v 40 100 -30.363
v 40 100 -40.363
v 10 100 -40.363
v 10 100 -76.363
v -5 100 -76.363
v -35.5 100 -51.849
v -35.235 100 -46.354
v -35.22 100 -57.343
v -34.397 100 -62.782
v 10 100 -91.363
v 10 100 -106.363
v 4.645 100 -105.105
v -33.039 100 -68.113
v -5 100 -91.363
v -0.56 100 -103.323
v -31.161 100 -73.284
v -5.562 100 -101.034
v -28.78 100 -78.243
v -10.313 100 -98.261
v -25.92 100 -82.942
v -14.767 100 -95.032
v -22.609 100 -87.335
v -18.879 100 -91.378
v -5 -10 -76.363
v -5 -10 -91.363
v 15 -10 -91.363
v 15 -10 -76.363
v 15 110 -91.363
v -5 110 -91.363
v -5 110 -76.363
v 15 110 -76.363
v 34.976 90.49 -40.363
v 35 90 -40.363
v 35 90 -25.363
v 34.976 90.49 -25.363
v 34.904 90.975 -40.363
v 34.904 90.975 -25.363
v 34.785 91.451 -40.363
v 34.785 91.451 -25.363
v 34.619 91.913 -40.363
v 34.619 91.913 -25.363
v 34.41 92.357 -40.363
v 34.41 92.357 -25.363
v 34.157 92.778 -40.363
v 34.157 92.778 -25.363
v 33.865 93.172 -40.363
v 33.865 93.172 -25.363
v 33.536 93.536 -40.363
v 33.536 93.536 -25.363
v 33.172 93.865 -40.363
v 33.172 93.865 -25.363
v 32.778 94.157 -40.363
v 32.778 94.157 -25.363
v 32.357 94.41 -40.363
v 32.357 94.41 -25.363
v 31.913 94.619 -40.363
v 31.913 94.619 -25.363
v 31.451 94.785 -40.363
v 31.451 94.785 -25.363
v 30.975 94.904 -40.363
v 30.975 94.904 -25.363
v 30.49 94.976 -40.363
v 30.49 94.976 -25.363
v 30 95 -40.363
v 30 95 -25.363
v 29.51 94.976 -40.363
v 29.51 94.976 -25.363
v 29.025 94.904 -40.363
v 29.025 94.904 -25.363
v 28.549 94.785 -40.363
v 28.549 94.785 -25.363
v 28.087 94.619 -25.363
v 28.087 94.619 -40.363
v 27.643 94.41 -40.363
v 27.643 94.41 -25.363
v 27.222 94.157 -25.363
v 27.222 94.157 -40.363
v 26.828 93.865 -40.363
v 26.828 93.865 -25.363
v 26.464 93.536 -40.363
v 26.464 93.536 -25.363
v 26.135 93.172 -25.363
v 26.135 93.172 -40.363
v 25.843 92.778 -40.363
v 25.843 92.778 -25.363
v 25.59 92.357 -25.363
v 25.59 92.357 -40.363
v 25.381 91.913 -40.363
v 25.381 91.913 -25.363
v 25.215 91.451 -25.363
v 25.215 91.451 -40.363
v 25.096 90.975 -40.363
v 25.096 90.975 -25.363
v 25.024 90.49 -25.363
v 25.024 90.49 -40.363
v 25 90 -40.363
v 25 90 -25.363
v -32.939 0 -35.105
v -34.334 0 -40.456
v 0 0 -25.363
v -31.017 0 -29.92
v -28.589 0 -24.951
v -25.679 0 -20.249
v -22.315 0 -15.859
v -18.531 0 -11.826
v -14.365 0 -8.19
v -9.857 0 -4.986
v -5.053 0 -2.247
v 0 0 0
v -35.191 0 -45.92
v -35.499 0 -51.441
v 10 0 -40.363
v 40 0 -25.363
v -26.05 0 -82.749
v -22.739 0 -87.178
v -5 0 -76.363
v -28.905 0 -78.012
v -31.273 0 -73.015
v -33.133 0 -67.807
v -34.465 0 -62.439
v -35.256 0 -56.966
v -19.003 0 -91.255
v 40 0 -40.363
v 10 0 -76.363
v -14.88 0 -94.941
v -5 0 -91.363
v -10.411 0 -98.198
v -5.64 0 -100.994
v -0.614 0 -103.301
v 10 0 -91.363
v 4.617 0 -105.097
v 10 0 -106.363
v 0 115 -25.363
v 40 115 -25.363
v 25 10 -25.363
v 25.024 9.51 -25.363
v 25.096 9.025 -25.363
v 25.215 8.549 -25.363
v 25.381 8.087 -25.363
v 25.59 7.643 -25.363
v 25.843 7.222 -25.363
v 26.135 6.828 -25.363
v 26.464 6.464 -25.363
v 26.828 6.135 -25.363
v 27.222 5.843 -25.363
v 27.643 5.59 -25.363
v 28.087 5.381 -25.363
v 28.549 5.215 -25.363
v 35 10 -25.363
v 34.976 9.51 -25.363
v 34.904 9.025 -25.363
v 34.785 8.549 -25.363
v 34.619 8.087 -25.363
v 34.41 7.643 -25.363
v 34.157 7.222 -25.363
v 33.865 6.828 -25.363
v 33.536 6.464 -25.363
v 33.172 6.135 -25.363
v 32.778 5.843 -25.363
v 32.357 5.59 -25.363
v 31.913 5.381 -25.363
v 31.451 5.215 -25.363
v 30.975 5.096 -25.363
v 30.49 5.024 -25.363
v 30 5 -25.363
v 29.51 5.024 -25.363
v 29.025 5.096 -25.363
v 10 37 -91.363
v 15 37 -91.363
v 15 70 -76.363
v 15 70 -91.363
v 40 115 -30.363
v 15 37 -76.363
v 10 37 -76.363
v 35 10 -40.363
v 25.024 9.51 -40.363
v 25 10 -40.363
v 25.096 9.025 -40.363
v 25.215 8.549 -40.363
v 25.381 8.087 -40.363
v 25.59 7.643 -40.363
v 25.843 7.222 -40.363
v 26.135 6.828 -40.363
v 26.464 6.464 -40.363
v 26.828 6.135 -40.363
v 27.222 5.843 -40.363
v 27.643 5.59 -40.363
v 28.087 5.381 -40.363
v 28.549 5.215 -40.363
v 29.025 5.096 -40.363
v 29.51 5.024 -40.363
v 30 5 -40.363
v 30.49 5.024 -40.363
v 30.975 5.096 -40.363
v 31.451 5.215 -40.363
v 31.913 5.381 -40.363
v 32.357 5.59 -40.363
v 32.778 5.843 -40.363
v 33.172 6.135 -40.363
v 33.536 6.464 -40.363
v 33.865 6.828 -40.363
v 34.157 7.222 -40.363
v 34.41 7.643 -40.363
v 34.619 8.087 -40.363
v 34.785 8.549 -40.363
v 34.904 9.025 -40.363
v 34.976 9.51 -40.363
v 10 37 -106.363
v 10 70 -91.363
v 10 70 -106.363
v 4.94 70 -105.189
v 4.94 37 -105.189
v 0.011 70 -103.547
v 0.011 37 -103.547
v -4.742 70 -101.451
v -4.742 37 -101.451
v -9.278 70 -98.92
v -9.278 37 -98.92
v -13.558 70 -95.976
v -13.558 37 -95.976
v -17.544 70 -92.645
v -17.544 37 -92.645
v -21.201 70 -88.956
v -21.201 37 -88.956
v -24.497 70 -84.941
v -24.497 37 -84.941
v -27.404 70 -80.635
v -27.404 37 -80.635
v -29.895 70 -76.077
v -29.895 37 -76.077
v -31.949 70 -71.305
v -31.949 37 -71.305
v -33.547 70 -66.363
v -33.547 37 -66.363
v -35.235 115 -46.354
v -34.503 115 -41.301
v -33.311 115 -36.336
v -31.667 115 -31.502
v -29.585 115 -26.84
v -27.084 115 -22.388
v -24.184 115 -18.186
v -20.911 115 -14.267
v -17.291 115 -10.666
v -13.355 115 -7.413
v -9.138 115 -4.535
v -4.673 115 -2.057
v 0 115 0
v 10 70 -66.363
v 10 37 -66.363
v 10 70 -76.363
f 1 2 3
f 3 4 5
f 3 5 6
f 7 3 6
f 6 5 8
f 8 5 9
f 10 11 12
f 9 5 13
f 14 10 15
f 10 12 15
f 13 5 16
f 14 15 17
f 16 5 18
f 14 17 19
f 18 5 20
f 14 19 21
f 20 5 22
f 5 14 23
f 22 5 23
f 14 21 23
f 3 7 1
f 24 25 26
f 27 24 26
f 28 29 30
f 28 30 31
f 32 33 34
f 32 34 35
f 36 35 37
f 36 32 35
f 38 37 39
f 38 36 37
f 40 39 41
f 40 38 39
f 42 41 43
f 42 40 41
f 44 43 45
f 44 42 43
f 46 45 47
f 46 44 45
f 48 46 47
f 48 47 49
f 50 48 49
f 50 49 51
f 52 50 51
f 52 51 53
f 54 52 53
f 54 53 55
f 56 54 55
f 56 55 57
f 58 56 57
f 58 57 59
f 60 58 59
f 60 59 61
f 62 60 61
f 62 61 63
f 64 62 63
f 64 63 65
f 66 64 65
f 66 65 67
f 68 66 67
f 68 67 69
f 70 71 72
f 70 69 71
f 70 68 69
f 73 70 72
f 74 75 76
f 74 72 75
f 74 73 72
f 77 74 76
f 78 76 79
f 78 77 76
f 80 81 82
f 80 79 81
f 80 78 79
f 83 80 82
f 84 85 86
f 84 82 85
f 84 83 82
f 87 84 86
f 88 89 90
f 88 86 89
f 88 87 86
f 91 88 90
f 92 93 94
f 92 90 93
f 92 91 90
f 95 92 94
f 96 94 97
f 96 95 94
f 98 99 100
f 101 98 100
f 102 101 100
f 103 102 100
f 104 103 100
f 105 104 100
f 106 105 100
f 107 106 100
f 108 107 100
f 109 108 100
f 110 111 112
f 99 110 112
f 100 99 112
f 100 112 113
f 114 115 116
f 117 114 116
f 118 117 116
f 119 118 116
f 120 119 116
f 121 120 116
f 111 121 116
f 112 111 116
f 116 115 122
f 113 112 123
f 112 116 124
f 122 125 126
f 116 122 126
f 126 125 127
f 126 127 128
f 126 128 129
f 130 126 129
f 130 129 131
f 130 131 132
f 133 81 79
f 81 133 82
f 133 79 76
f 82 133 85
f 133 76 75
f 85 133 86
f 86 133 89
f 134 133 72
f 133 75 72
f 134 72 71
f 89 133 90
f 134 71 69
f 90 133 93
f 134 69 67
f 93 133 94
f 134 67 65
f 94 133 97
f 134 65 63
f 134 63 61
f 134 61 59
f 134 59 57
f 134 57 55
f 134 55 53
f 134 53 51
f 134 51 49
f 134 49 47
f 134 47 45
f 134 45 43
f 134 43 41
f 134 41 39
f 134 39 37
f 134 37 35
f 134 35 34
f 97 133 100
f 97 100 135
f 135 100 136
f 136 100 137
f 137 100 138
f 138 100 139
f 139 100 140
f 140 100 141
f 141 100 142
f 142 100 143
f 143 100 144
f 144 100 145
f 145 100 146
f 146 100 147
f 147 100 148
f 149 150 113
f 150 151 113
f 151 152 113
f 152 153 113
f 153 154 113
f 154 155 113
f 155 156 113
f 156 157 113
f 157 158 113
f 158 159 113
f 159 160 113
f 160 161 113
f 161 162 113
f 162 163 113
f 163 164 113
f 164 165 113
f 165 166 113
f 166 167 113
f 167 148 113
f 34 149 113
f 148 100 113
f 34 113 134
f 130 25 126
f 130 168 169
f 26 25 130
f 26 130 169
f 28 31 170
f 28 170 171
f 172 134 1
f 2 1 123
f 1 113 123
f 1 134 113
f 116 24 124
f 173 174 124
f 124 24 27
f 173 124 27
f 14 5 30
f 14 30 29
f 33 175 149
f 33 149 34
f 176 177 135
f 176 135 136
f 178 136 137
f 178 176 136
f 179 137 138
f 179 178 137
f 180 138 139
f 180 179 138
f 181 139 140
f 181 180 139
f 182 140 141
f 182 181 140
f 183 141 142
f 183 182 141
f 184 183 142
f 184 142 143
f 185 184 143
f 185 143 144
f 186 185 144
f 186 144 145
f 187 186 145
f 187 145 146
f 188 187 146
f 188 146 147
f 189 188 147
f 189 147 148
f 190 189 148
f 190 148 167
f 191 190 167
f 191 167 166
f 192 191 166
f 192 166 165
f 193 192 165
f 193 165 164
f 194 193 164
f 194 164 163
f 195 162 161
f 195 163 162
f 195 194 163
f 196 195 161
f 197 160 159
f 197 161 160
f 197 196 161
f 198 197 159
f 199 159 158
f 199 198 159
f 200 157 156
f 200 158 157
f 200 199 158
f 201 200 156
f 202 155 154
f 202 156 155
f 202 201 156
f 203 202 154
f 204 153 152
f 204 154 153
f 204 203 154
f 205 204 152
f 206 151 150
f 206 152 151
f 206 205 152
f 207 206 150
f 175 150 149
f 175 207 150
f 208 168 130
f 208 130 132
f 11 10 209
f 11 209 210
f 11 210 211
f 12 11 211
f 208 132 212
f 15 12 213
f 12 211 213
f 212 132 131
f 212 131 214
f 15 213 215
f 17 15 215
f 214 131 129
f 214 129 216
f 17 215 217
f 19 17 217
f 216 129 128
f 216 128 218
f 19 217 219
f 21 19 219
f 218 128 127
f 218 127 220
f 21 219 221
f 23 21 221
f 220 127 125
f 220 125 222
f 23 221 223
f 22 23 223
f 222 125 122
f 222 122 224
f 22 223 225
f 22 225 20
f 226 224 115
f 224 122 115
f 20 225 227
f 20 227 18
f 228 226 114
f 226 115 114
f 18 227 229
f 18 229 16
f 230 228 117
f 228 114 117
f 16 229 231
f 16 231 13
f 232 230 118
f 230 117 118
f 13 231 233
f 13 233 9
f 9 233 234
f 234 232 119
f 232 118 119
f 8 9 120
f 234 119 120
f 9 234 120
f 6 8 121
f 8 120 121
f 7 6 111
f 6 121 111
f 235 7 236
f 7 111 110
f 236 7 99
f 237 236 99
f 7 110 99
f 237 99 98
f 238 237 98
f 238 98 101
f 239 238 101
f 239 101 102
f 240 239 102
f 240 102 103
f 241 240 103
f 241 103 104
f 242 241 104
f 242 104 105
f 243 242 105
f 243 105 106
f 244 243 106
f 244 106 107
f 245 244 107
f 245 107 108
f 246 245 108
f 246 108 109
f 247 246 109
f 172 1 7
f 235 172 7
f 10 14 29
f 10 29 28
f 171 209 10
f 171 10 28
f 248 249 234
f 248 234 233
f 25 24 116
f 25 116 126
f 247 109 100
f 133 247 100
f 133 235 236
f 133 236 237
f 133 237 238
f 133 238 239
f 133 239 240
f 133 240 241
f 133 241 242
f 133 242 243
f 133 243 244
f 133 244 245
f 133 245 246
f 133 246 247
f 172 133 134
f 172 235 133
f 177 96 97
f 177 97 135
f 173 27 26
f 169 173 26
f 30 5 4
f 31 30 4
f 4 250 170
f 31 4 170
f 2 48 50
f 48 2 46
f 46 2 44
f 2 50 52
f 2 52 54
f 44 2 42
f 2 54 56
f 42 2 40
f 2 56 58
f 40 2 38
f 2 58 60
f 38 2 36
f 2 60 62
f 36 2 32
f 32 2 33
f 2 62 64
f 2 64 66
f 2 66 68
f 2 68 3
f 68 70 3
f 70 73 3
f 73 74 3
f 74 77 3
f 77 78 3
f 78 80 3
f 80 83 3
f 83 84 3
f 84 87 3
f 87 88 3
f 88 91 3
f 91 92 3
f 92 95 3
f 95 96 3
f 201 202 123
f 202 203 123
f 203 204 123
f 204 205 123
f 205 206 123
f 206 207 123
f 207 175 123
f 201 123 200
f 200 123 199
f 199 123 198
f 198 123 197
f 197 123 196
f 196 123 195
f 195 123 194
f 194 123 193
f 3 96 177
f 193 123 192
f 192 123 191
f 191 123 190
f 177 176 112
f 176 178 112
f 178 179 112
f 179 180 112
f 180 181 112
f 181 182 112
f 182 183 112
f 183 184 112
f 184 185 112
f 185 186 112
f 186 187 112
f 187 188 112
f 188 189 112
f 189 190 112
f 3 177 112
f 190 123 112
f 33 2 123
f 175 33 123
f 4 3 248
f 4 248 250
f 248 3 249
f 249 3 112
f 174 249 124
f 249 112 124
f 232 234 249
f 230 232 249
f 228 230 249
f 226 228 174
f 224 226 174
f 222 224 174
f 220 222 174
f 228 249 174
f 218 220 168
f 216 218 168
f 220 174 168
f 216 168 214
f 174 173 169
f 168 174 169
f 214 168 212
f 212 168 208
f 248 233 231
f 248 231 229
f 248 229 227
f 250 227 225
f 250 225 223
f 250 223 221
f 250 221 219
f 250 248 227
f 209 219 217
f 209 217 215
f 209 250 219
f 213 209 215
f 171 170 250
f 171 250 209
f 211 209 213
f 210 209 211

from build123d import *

# Parameters (mm, degrees)
BOSS_EXTRUDE1_DEPTH = 115
CUT_EXTRUDE1_START  = -15
CUT_EXTRUDE1_DEPTH  = 15
BOSS_EXTRUDE2_START = -110
SKETCH3_W           = 20
SKETCH3_H           = 15
BOSS_EXTRUDE2_DEPTH = 120
SKETCH5_W           = 40
SKETCH5_H           = 33
CUT_EXTRUDE2_DEPTH  = 165.585219816
CUT_EXTRUDE3_DEPTH  = 139.495487291


with BuildPart() as part:
    # Sketch1 → Boss-Extrude1 (new body)
    with BuildSketch(Plane(origin=(0, 0, 0), x_dir=(1, 0, 0), z_dir=(0, 1, 0))):
        with BuildLine():
            Line((0, 0), (0, 25.362796982))
            Line((0, 25.362796982), (40, 25.362796982))
            Line((40, 25.362796982), (40, 40.362796982))
            Line((40, 40.362796982), (10, 40.362796982))
            Line((10, 40.362796982), (10, 106.362796982))
            ThreePointArc((10, 106.362796982), (-35.256322222, 56.96621079), (0, 0))
        make_face()
    extrude(amount=BOSS_EXTRUDE1_DEPTH)

    # Sketch2 → Cut-Extrude1 (cut)
    with BuildSketch(Plane(origin=(0, 115, 0), x_dir=(1, 0, 0), z_dir=(0, 1, 0)).offset(CUT_EXTRUDE1_START)):
        with BuildLine():
            Line((40, 30.362796982), (-35.235044142, 46.354499282))
            ThreePointArc((-35.235044142, 46.354499282), (-24.318751046, 85.179188449), (10, 106.362796982))
            Line((10, 106.362796982), (10, 40.362796982))
            Line((10, 40.362796982), (40, 40.362796982))
            Line((40, 40.362796982), (40, 30.362796982))
        make_face()
    extrude(amount=CUT_EXTRUDE1_DEPTH, mode=Mode.SUBTRACT)

    # Sketch3 → Boss-Extrude2 (add)
    with BuildSketch(Plane(origin=(0, 100, 0), x_dir=(1, 0, 0), z_dir=(0, 1, 0)).offset(BOSS_EXTRUDE2_START)):
        with Locations((5, 83.862796982)):
            Rectangle(SKETCH3_W, SKETCH3_H)
    extrude(amount=BOSS_EXTRUDE2_DEPTH)

    # Sketch5 → Cut-Extrude2 (cut, through all)
    with BuildSketch(Plane(origin=(15, 0, 0), x_dir=(0, 0, -1), z_dir=(1, 0, 0))):
        with Locations((86.362796982, 53.5)):
            Rectangle(SKETCH5_W, SKETCH5_H)
    extrude(amount=-CUT_EXTRUDE2_DEPTH, mode=Mode.SUBTRACT)

    # Sketch6 → Cut-Extrude3 (cut, through all)
    with BuildSketch(Plane(origin=(0, 0, -40.362796982), x_dir=(-1, 0, 0), z_dir=(0, 0, -1))):
        with BuildLine():
            Line((-25, 90), (-25, 10))
            ThreePointArc((-25, 10), (-30, 5), (-35, 10))
            Line((-35, 10), (-35, 90))
            ThreePointArc((-35, 90), (-30, 95), (-25, 90))
        make_face()
    extrude(amount=-CUT_EXTRUDE3_DEPTH, mode=Mode.SUBTRACT)


solid = part.part
